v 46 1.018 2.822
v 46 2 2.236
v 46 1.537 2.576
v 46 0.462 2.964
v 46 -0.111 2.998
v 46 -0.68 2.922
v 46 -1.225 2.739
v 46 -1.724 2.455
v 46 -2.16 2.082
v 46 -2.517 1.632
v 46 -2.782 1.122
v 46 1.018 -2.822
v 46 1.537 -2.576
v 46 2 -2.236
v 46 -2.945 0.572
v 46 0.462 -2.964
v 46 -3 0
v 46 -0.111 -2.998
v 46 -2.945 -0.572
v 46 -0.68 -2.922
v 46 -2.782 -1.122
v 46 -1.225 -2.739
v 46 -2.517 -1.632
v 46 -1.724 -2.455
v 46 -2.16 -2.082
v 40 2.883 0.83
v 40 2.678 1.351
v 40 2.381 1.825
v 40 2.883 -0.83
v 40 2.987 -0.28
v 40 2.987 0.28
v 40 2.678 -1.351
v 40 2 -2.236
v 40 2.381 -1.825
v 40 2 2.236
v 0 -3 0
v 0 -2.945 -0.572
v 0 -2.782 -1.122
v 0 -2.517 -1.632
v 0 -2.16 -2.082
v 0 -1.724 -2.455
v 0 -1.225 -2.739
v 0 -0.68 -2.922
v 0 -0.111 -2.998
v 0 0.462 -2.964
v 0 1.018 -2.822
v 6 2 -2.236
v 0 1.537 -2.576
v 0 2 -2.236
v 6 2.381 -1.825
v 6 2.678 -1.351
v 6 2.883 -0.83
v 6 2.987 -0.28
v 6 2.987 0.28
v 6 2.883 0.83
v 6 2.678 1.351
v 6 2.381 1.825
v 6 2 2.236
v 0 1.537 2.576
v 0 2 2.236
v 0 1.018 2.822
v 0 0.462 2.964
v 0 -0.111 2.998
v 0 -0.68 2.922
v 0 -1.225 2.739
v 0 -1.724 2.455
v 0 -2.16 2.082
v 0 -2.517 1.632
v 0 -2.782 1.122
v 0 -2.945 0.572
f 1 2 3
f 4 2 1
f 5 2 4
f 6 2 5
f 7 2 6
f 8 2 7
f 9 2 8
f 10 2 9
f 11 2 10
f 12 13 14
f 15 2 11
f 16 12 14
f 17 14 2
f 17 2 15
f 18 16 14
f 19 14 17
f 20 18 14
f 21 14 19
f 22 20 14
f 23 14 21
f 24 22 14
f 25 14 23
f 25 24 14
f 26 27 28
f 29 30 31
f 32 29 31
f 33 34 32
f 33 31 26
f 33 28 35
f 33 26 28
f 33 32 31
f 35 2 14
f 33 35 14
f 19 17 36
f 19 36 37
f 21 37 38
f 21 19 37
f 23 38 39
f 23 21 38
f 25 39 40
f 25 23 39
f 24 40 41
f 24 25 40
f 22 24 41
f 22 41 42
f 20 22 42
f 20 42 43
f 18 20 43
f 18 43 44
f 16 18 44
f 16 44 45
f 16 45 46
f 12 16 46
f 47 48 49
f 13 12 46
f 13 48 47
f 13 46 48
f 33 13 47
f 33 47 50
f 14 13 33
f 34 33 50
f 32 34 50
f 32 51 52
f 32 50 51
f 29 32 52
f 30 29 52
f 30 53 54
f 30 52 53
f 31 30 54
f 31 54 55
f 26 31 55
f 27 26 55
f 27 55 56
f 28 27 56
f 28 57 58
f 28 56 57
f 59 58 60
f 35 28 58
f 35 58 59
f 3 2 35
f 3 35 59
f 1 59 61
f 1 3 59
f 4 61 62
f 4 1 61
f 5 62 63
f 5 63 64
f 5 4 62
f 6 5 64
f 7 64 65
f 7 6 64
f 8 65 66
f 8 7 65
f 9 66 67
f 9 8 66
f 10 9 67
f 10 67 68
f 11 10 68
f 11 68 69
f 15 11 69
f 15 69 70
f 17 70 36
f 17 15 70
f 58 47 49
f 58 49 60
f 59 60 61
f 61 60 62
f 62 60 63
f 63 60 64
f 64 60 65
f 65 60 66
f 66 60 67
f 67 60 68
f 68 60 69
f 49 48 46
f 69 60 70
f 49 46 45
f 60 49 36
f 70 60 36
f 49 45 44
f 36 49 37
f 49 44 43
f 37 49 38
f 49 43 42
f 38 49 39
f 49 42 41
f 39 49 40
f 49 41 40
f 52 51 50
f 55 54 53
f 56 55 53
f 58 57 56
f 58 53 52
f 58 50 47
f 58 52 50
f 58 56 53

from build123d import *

# Parameters (mm, degrees)
SKETCH2_W          = 46
SKETCH2_H          = 3
CUT_EXTRUDE1_DEPTH = 6
CUT_EXTRUDE2_DEPTH = 6


with BuildPart() as part:
    # Sketch2 → Revolve1 (revolve)
    with BuildSketch(Plane.XY):
        with Locations((23, -1.5)):
            Rectangle(SKETCH2_W, SKETCH2_H)
    revolve(axis=Axis((0, 0, 0), (1, 0, 0)))

    # Sketch3 → Cut-Extrude1 (cut)
    with BuildSketch(Plane(origin=(46, 0, 0), x_dir=(0, 0, -1), z_dir=(1, 0, 0))):
        with BuildLine():
            Line((-2.236067977, 2), (2.236067977, 2))
            ThreePointArc((2.236067977, 2), (0, 3), (-2.236067977, 2))
        make_face()
    extrude(amount=-CUT_EXTRUDE1_DEPTH, mode=Mode.SUBTRACT)

    # Sketch4 → Cut-Extrude2 (cut)
    with BuildSketch(Plane.ZY):
        with BuildLine():
            Line((-2.236067977, 2), (2.236067977, 2))
            ThreePointArc((2.236067977, 2), (0, 3), (-2.236067977, 2))
        make_face()
    extrude(amount=-CUT_EXTRUDE2_DEPTH, mode=Mode.SUBTRACT)


solid = part.part
